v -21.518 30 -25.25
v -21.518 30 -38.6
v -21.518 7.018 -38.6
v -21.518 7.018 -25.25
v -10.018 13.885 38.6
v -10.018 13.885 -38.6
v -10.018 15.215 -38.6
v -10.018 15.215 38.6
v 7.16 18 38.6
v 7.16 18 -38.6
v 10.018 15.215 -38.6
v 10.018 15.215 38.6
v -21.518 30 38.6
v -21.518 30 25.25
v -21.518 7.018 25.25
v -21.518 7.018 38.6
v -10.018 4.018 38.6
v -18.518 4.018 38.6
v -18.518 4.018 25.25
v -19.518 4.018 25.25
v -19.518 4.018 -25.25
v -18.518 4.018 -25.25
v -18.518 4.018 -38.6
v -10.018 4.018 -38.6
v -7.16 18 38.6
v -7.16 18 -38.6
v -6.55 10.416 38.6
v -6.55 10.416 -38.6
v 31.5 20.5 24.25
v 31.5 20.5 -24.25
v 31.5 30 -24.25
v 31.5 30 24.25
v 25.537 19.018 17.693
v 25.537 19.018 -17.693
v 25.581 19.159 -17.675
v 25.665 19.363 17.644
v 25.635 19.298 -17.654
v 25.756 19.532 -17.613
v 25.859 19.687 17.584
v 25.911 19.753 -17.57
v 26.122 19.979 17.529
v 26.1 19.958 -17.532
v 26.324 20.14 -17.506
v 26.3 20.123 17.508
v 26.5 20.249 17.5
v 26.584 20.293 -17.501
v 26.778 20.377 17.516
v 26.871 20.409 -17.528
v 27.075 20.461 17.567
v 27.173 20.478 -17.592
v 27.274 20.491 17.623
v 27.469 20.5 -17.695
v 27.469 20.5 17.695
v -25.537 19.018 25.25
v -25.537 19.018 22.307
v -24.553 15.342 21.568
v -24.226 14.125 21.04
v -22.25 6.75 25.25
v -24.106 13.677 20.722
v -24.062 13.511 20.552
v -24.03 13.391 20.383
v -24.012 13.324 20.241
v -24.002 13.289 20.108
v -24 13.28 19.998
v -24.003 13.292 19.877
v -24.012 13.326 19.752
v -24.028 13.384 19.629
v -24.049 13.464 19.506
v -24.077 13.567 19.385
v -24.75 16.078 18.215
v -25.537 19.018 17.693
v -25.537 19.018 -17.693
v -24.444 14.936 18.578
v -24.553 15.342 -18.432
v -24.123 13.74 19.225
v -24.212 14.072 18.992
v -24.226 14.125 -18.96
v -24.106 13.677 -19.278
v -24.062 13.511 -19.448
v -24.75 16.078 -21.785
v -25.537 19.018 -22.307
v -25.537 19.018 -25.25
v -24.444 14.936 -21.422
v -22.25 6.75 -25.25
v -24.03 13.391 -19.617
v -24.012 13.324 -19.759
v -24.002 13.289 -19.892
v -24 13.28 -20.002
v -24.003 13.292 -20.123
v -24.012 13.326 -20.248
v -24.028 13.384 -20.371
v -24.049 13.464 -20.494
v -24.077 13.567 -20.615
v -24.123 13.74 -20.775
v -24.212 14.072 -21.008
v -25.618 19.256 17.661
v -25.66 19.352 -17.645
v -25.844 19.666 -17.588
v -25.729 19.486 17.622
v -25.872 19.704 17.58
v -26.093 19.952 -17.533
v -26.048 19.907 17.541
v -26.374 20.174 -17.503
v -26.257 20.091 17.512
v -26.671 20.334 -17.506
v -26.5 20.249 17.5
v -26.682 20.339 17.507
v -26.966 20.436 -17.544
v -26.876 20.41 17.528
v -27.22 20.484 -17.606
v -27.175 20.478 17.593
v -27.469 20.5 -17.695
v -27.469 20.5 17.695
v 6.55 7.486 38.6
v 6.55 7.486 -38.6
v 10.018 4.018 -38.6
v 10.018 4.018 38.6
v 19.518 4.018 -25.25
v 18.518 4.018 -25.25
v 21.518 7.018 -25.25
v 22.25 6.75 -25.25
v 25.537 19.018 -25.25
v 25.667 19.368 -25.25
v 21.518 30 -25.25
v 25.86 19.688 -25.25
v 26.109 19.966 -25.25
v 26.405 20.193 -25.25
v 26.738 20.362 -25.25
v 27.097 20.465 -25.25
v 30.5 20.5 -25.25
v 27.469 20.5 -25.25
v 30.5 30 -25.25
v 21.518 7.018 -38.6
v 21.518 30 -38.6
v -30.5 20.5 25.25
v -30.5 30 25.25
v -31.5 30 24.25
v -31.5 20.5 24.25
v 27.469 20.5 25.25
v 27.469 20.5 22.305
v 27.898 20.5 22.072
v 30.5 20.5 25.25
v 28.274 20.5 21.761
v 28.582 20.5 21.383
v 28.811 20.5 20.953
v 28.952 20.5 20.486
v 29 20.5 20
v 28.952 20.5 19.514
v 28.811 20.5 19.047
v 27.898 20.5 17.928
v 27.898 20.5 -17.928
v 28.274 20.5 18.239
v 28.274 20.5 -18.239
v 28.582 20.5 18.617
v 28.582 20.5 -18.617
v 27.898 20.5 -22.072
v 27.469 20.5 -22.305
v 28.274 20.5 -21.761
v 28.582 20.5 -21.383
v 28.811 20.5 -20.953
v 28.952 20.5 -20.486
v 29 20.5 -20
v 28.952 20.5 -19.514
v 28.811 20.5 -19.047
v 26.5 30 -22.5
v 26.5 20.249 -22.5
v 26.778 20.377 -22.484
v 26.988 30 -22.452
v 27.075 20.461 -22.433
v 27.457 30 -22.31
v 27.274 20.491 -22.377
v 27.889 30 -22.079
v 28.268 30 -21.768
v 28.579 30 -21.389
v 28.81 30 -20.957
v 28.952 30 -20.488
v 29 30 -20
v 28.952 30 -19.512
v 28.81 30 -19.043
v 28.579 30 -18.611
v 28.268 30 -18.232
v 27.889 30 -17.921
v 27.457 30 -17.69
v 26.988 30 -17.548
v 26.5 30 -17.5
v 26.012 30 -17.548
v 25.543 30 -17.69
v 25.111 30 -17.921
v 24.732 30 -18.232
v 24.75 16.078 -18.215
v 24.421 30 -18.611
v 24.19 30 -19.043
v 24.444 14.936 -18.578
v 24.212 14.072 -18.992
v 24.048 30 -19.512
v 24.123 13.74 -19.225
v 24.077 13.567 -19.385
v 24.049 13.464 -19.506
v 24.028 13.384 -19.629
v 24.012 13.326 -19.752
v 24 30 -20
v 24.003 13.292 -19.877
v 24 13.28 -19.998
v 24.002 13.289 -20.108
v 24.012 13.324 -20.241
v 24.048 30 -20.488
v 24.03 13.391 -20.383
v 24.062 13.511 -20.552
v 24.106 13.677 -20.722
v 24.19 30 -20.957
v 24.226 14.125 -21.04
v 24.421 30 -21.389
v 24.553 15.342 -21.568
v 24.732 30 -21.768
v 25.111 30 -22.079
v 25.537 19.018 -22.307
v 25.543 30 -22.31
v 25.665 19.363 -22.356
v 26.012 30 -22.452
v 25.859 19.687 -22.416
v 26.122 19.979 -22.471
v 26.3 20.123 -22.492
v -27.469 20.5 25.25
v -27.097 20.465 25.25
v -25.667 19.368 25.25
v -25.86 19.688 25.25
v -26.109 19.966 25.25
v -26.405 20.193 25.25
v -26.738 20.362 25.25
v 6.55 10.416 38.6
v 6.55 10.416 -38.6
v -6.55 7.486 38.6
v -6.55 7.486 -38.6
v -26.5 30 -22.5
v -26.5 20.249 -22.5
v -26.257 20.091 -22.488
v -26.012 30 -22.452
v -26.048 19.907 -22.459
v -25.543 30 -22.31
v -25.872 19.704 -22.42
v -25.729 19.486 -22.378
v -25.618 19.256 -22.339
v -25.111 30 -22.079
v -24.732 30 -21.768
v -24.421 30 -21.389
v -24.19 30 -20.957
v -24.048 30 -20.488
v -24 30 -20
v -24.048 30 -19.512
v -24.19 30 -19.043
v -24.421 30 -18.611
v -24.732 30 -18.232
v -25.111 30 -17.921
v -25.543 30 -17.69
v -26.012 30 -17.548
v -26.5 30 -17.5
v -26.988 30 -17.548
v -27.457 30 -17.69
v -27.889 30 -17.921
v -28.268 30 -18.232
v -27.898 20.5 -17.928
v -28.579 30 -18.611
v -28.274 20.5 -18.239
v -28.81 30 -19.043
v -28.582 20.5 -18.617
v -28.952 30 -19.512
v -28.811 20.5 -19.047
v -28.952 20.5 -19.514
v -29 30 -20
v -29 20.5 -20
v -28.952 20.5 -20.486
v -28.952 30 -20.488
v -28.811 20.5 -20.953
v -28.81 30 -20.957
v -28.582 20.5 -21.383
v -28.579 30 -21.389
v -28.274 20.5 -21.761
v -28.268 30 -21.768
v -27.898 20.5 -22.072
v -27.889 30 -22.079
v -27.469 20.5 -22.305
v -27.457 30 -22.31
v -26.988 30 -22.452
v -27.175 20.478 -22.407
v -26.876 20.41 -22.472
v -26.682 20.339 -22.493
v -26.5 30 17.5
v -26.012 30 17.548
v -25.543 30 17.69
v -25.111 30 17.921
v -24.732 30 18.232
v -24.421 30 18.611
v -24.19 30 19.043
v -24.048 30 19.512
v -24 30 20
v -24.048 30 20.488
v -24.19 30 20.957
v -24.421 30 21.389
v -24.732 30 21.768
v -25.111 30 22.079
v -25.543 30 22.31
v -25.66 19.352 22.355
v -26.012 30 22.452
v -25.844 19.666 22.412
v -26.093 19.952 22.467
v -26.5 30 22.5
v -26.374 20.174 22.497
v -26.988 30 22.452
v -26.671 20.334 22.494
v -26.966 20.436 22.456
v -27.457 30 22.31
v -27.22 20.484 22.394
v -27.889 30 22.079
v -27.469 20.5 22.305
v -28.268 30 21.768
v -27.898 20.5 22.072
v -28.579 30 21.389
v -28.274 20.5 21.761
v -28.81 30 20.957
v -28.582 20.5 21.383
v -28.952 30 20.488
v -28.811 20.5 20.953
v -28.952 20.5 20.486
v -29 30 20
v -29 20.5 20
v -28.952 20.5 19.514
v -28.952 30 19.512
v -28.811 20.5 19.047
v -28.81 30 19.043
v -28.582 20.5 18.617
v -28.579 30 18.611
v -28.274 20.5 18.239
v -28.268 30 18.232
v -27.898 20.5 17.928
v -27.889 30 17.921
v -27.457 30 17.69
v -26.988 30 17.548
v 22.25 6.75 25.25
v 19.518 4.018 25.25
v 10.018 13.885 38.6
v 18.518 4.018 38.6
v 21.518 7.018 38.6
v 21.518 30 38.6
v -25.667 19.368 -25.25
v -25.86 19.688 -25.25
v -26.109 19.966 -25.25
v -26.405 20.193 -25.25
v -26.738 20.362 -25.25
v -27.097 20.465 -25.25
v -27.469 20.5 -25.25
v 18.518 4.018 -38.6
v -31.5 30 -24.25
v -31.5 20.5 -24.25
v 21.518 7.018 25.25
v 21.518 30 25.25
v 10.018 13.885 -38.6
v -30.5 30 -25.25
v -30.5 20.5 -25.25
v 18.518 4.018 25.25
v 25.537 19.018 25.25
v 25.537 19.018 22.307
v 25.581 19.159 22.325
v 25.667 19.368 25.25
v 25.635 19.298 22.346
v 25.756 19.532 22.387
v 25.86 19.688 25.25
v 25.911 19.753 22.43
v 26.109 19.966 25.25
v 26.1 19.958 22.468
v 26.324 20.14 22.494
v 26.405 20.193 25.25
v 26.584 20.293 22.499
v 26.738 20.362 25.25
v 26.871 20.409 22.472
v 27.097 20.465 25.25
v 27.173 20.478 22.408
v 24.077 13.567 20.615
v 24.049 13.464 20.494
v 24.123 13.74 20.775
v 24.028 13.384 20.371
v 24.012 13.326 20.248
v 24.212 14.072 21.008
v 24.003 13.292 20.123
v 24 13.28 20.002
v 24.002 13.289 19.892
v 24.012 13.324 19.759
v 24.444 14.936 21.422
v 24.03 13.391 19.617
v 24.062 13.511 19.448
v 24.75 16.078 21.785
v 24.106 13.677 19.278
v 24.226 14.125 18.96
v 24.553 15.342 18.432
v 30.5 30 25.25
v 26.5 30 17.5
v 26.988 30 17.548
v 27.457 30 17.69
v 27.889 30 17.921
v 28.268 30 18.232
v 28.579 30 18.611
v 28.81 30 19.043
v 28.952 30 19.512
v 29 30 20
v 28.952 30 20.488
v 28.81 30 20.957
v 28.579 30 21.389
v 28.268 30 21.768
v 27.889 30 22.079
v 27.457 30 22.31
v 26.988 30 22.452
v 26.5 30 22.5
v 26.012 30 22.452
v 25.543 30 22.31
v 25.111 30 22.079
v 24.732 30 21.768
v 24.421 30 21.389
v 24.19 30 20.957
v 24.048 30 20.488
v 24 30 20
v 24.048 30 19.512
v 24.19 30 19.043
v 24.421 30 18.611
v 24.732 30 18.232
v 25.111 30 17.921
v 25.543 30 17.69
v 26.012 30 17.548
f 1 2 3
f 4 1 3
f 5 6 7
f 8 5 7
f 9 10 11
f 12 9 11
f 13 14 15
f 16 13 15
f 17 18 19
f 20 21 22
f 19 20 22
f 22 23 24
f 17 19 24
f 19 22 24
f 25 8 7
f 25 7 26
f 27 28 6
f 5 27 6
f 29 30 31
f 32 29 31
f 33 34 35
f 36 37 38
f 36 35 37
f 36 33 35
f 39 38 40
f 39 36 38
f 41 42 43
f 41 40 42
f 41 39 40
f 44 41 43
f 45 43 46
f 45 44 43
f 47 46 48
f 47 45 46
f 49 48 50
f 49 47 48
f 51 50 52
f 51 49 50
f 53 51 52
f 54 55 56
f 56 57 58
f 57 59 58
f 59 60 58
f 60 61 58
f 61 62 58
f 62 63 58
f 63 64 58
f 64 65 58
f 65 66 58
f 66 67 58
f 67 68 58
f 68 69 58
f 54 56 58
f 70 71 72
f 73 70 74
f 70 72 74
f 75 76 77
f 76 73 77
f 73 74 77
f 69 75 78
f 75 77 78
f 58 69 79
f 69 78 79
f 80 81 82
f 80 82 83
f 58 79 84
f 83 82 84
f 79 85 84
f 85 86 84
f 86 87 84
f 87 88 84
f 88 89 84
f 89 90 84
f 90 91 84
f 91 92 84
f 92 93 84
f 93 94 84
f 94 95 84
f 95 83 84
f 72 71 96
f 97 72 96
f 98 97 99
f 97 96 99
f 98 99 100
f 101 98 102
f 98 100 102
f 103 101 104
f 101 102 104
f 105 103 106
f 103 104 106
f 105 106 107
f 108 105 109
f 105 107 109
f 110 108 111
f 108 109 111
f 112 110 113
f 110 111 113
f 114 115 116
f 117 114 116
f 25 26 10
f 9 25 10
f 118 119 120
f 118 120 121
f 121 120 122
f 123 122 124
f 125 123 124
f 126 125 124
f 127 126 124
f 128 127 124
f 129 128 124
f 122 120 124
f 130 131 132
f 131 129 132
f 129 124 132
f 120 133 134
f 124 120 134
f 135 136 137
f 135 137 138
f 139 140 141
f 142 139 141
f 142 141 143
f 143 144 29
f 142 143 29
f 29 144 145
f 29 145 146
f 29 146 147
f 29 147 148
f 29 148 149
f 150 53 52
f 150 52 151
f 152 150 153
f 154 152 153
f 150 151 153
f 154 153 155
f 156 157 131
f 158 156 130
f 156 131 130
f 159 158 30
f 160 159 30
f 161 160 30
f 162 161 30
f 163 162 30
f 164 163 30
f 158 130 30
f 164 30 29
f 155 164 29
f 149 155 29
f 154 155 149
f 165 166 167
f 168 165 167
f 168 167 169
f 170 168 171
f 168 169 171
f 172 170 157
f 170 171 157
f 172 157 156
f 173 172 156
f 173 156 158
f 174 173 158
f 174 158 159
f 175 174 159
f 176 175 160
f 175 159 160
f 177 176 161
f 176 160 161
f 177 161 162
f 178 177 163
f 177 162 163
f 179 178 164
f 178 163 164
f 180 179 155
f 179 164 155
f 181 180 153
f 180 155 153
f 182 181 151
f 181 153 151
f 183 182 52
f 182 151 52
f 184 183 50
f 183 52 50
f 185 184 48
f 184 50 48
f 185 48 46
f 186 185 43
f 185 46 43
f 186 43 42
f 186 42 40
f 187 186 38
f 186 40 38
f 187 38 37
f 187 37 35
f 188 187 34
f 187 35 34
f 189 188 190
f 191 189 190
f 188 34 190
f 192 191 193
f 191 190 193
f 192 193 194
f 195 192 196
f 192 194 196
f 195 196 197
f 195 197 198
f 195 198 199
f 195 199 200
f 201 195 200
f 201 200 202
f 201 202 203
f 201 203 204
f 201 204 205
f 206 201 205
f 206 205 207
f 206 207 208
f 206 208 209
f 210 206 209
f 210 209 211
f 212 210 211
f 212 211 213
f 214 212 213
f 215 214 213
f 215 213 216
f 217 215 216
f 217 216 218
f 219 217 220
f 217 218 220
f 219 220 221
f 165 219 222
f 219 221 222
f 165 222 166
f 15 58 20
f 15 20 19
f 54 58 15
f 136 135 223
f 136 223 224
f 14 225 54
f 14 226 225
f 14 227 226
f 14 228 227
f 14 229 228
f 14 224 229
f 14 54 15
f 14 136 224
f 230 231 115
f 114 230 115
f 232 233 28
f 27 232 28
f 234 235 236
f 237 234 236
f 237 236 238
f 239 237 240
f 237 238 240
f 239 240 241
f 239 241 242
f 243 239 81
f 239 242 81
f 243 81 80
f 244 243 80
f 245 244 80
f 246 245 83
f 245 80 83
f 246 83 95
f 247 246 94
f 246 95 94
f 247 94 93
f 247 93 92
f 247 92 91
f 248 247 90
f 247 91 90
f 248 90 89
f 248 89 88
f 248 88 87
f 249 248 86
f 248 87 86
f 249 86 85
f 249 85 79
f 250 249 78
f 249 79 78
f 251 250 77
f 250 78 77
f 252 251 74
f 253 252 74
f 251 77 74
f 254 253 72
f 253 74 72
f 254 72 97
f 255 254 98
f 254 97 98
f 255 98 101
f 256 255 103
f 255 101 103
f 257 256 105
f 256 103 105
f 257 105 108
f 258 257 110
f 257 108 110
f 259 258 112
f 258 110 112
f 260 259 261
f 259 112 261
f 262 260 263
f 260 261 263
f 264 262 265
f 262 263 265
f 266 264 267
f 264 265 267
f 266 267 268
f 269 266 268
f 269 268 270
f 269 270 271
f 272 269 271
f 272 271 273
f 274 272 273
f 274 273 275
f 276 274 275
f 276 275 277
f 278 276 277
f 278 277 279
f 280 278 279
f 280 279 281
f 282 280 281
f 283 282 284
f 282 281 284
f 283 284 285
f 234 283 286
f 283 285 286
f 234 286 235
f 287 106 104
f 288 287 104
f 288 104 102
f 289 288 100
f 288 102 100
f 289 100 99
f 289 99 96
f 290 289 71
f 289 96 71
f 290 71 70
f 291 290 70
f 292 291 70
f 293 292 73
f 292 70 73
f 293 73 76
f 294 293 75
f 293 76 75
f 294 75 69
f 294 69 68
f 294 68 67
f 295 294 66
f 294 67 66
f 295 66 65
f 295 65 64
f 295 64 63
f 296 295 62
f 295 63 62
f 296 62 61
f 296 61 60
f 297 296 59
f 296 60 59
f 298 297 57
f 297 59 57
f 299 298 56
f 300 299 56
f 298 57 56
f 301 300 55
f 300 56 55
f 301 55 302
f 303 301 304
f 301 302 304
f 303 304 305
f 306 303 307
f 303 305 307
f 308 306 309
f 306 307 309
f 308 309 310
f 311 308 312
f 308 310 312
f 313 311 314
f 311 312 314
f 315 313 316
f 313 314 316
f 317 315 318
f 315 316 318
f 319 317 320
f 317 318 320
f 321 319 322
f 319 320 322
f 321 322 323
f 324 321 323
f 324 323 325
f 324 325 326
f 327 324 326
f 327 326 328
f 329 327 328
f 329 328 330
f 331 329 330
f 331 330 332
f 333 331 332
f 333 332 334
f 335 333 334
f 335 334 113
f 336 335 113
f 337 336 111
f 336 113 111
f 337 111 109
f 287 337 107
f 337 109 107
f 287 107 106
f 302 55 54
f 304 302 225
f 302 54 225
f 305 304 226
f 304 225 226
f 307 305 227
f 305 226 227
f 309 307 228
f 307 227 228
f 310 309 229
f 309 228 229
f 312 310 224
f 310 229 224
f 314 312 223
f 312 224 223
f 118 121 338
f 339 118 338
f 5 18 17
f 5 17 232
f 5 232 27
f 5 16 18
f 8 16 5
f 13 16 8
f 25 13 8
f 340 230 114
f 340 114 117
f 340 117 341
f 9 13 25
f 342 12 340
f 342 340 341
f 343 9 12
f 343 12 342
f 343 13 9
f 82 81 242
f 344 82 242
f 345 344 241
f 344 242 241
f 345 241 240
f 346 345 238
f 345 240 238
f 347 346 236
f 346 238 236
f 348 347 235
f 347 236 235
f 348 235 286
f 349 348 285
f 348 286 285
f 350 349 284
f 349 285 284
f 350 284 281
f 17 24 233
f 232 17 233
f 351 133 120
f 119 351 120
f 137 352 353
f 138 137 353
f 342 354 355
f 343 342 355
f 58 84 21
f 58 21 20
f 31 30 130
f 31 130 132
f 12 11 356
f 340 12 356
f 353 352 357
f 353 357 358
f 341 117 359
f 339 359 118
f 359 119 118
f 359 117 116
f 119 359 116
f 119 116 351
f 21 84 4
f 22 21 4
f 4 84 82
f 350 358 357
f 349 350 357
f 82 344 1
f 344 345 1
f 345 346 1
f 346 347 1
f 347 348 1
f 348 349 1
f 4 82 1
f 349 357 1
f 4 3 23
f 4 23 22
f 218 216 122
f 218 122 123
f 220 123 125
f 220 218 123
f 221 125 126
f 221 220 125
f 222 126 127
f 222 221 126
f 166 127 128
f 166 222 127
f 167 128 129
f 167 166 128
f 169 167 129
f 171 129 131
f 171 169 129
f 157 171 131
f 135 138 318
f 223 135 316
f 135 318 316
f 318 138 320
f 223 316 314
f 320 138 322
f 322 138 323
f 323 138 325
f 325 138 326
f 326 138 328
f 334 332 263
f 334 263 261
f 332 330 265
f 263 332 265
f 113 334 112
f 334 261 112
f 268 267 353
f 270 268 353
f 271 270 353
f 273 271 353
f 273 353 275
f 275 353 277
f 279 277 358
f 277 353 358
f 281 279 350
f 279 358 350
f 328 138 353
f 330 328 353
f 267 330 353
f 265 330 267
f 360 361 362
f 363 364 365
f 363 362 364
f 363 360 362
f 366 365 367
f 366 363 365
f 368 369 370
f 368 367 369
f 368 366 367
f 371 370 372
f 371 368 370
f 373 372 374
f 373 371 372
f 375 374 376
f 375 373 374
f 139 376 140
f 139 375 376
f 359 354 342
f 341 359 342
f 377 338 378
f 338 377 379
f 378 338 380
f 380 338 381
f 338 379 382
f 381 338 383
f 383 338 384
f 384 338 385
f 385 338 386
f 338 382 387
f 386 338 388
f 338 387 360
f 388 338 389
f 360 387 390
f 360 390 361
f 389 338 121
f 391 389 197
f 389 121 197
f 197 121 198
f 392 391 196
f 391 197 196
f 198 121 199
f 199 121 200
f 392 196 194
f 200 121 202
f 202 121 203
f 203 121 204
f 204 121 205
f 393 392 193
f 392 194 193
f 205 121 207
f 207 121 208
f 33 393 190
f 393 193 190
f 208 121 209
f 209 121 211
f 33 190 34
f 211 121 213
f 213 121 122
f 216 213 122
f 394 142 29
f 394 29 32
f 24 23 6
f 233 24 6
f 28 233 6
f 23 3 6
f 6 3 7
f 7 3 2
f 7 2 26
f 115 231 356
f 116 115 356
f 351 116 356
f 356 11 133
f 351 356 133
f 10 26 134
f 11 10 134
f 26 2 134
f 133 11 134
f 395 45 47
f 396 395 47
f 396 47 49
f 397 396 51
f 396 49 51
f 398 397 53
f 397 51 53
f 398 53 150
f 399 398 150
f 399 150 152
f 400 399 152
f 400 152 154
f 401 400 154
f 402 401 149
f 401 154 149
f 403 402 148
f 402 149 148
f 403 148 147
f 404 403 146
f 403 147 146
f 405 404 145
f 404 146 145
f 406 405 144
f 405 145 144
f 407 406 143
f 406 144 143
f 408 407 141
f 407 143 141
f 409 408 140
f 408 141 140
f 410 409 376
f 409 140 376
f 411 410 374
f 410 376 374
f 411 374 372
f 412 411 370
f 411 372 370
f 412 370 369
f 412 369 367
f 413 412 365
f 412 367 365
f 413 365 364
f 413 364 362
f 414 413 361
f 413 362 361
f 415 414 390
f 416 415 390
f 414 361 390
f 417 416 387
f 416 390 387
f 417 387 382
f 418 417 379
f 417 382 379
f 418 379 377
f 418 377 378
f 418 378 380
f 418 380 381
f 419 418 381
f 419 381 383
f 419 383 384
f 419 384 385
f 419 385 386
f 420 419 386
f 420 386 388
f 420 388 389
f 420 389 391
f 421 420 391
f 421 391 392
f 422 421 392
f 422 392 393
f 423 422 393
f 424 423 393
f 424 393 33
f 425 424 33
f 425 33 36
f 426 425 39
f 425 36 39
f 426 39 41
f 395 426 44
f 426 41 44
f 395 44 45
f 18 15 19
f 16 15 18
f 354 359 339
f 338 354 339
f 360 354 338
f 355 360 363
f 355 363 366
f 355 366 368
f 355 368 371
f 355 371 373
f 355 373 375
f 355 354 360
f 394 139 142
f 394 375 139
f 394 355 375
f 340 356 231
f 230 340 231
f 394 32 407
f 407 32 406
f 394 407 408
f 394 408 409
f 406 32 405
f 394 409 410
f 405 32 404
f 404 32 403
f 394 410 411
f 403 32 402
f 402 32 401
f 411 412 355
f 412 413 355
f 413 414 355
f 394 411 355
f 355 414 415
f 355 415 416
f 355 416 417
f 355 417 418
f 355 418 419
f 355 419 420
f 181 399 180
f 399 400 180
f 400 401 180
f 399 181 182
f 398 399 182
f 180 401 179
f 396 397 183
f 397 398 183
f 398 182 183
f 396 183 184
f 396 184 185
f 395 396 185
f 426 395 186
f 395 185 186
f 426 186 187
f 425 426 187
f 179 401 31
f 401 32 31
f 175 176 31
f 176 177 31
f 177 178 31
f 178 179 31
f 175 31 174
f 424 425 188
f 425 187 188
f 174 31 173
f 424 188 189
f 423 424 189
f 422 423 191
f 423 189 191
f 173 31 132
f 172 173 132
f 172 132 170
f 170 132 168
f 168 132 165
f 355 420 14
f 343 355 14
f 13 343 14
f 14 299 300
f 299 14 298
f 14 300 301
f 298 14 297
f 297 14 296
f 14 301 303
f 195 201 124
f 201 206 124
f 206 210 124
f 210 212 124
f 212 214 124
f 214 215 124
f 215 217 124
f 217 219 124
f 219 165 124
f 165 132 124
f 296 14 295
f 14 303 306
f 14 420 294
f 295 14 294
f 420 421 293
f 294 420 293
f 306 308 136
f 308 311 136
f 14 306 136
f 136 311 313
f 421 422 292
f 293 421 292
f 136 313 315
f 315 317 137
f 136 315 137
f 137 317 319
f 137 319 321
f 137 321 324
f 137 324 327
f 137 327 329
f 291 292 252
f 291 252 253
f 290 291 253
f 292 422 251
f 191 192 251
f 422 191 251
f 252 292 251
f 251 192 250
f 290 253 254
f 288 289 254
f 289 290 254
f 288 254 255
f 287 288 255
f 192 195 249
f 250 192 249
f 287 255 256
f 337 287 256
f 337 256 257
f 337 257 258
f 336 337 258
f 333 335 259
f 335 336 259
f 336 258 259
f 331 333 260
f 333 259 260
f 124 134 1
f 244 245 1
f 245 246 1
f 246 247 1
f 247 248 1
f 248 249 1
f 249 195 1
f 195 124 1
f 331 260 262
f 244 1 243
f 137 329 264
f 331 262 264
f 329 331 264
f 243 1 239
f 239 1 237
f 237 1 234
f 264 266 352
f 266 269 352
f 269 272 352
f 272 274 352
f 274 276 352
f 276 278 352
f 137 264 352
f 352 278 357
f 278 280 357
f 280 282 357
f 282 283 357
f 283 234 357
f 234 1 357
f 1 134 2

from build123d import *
from OCP.BRepFilletAPI import BRepFilletAPI_MakeChamfer

# Parameters (mm, degrees)
BOSS_EXTRUDE1_DEPTH       = 38.6
BOSS_EXTRUDE1_DEPTH_BACK  = 38.6
BOSS_EXTRUDE2_DEPTH       = 25.25
BOSS_EXTRUDE2_DEPTH_BACK  = 25.25
CHAMFER1_SIZE             = 3
CHAMFER2_SIZE             = 2
CHAMFER2_SIZE2            = 2.828427125
FILLET1_R                 = 2
M6X1_0_TAPPED_HOLE1_D     = 5
M6X1_0_TAPPED_HOLE1_DEPTH = 25.981766235
M6X1_0_TAPPED_HOLE1_TIP   = 1.502151548
CHAMFER3_SIZE             = 1


with BuildPart() as part:
    # Sketch3 → Boss-Extrude1 (new, two sides: drawn at the far end of the back side and taken through both)
    with BuildSketch(Plane.XY.offset(-BOSS_EXTRUDE1_DEPTH_BACK)):
        Polygon((-21.518233765, 4.018233765), (-10.018233765, 4.018233765), (-6.55, 7.48646753), (-6.55, 10.41646753), (-10.018233765, 13.884701295), (-10.018233765, 15.214701295), (-7.16, 18), (7.16, 18), (10.018233765, 15.214701295), (10.018233765, 13.884701295), (6.55, 10.41646753), (6.55, 7.48646753), (10.018233765, 4.018233765), (21.518233765, 4.018233765), (21.518233765, 30), (-21.518233765, 30), align=None)
    extrude(amount=BOSS_EXTRUDE1_DEPTH + BOSS_EXTRUDE1_DEPTH_BACK)

    # Sketch3<4> → Boss-Extrude2 (add, two sides: drawn at the far end of the back side and taken through both)
    with BuildSketch(Plane.XY.offset(-BOSS_EXTRUDE2_DEPTH_BACK)):
        Polygon((-25.934509717, 20.5), (-21.518233765, 4.018233765), (-21.518233765, 30), (-31.5, 30), (-31.5, 20.5), align=None)
        Polygon((21.518233765, 30), (21.518233765, 4.018233765), (25.934509717, 20.5), (31.5, 20.5), (31.5, 30), align=None)
    extrude(amount=BOSS_EXTRUDE2_DEPTH + BOSS_EXTRUDE2_DEPTH_BACK)

    # Chamfer1
    chamfer1_edges = [part.edges().sort_by_distance(p)[0] for p in [
        (21.518233765, 4.018233765, -31.925),
        (-21.518233765, 4.018233765, -31.925),
        (-21.518233765, 4.018233765, 31.925),
        (21.518233765, 4.018233765, 31.925),
    ]]
    chamfer(chamfer1_edges, length=CHAMFER1_SIZE)

    # Chamfer2: one chamfer whose edges measure the first distance from different faces: ONE call of the kernel's chamfer builder (chamfer() names one face for all edges)
    chamfer2_edges_1 = [part.edges().sort_by_distance(p)[0] for p in [
        (-21.518233765, 4.018233765, 0),
    ]]
    chamfer2_side_1 = [part.faces().sort_by_distance(p)[0] for p in [
        (-15.346759208, 4.018233765, 0),
    ]]
    chamfer2_edges_2 = [part.edges().sort_by_distance(p)[0] for p in [
        (21.518233765, 4.018233765, 0),
    ]]
    chamfer2_side_2 = [part.faces().sort_by_distance(p)[0] for p in [
        (15.346759208, 4.018233765, 0),
    ]]
    chamfer2 = BRepFilletAPI_MakeChamfer(part.part.solid().wrapped)
    for e in chamfer2_edges_1:
        chamfer2.Add(CHAMFER2_SIZE, CHAMFER2_SIZE2, e.wrapped, chamfer2_side_1[0].wrapped)  # the first distance lies on this face
    for e in chamfer2_edges_2:
        chamfer2.Add(CHAMFER2_SIZE, CHAMFER2_SIZE2, e.wrapped, chamfer2_side_2[0].wrapped)  # the first distance lies on this face
    add(Compound.cast(chamfer2.Shape()), mode=Mode.REPLACE)

    # Fillet1
    fillet1_edges = [part.edges().sort_by_distance(p)[0] for p in [
        (-25.934509717, 20.5, 0),
        (25.934509717, 20.5, 0),
    ]]
    fillet(fillet1_edges, radius=FILLET1_R)

    # M6x1.0 Tapped Hole1
    with Locations(Plane(origin=(-26.5, 30, 20), x_dir=(0, 0, 1), z_dir=(0, 1, 0))):
        with Locations((0, 0), (-40, 0), (-40, 53), (0, 53)):
            Hole(M6X1_0_TAPPED_HOLE1_D / 2, depth=M6X1_0_TAPPED_HOLE1_DEPTH)
            with Locations((0, 0, -(M6X1_0_TAPPED_HOLE1_DEPTH + M6X1_0_TAPPED_HOLE1_TIP / 2))):  # 118° drill point
                Cone(0, M6X1_0_TAPPED_HOLE1_D / 2, M6X1_0_TAPPED_HOLE1_TIP, mode=Mode.SUBTRACT)

    # Chamfer3
    chamfer3_edges = [part.edges().sort_by_distance(p)[0] for p in [
        (31.5, 25.25, 25.25),
        (-31.5, 25.25, 25.25),
        (-31.5, 25.25, -25.25),
        (31.5, 25.25, -25.25),
    ]]
    chamfer(chamfer3_edges, length=CHAMFER3_SIZE)


solid = part.part
